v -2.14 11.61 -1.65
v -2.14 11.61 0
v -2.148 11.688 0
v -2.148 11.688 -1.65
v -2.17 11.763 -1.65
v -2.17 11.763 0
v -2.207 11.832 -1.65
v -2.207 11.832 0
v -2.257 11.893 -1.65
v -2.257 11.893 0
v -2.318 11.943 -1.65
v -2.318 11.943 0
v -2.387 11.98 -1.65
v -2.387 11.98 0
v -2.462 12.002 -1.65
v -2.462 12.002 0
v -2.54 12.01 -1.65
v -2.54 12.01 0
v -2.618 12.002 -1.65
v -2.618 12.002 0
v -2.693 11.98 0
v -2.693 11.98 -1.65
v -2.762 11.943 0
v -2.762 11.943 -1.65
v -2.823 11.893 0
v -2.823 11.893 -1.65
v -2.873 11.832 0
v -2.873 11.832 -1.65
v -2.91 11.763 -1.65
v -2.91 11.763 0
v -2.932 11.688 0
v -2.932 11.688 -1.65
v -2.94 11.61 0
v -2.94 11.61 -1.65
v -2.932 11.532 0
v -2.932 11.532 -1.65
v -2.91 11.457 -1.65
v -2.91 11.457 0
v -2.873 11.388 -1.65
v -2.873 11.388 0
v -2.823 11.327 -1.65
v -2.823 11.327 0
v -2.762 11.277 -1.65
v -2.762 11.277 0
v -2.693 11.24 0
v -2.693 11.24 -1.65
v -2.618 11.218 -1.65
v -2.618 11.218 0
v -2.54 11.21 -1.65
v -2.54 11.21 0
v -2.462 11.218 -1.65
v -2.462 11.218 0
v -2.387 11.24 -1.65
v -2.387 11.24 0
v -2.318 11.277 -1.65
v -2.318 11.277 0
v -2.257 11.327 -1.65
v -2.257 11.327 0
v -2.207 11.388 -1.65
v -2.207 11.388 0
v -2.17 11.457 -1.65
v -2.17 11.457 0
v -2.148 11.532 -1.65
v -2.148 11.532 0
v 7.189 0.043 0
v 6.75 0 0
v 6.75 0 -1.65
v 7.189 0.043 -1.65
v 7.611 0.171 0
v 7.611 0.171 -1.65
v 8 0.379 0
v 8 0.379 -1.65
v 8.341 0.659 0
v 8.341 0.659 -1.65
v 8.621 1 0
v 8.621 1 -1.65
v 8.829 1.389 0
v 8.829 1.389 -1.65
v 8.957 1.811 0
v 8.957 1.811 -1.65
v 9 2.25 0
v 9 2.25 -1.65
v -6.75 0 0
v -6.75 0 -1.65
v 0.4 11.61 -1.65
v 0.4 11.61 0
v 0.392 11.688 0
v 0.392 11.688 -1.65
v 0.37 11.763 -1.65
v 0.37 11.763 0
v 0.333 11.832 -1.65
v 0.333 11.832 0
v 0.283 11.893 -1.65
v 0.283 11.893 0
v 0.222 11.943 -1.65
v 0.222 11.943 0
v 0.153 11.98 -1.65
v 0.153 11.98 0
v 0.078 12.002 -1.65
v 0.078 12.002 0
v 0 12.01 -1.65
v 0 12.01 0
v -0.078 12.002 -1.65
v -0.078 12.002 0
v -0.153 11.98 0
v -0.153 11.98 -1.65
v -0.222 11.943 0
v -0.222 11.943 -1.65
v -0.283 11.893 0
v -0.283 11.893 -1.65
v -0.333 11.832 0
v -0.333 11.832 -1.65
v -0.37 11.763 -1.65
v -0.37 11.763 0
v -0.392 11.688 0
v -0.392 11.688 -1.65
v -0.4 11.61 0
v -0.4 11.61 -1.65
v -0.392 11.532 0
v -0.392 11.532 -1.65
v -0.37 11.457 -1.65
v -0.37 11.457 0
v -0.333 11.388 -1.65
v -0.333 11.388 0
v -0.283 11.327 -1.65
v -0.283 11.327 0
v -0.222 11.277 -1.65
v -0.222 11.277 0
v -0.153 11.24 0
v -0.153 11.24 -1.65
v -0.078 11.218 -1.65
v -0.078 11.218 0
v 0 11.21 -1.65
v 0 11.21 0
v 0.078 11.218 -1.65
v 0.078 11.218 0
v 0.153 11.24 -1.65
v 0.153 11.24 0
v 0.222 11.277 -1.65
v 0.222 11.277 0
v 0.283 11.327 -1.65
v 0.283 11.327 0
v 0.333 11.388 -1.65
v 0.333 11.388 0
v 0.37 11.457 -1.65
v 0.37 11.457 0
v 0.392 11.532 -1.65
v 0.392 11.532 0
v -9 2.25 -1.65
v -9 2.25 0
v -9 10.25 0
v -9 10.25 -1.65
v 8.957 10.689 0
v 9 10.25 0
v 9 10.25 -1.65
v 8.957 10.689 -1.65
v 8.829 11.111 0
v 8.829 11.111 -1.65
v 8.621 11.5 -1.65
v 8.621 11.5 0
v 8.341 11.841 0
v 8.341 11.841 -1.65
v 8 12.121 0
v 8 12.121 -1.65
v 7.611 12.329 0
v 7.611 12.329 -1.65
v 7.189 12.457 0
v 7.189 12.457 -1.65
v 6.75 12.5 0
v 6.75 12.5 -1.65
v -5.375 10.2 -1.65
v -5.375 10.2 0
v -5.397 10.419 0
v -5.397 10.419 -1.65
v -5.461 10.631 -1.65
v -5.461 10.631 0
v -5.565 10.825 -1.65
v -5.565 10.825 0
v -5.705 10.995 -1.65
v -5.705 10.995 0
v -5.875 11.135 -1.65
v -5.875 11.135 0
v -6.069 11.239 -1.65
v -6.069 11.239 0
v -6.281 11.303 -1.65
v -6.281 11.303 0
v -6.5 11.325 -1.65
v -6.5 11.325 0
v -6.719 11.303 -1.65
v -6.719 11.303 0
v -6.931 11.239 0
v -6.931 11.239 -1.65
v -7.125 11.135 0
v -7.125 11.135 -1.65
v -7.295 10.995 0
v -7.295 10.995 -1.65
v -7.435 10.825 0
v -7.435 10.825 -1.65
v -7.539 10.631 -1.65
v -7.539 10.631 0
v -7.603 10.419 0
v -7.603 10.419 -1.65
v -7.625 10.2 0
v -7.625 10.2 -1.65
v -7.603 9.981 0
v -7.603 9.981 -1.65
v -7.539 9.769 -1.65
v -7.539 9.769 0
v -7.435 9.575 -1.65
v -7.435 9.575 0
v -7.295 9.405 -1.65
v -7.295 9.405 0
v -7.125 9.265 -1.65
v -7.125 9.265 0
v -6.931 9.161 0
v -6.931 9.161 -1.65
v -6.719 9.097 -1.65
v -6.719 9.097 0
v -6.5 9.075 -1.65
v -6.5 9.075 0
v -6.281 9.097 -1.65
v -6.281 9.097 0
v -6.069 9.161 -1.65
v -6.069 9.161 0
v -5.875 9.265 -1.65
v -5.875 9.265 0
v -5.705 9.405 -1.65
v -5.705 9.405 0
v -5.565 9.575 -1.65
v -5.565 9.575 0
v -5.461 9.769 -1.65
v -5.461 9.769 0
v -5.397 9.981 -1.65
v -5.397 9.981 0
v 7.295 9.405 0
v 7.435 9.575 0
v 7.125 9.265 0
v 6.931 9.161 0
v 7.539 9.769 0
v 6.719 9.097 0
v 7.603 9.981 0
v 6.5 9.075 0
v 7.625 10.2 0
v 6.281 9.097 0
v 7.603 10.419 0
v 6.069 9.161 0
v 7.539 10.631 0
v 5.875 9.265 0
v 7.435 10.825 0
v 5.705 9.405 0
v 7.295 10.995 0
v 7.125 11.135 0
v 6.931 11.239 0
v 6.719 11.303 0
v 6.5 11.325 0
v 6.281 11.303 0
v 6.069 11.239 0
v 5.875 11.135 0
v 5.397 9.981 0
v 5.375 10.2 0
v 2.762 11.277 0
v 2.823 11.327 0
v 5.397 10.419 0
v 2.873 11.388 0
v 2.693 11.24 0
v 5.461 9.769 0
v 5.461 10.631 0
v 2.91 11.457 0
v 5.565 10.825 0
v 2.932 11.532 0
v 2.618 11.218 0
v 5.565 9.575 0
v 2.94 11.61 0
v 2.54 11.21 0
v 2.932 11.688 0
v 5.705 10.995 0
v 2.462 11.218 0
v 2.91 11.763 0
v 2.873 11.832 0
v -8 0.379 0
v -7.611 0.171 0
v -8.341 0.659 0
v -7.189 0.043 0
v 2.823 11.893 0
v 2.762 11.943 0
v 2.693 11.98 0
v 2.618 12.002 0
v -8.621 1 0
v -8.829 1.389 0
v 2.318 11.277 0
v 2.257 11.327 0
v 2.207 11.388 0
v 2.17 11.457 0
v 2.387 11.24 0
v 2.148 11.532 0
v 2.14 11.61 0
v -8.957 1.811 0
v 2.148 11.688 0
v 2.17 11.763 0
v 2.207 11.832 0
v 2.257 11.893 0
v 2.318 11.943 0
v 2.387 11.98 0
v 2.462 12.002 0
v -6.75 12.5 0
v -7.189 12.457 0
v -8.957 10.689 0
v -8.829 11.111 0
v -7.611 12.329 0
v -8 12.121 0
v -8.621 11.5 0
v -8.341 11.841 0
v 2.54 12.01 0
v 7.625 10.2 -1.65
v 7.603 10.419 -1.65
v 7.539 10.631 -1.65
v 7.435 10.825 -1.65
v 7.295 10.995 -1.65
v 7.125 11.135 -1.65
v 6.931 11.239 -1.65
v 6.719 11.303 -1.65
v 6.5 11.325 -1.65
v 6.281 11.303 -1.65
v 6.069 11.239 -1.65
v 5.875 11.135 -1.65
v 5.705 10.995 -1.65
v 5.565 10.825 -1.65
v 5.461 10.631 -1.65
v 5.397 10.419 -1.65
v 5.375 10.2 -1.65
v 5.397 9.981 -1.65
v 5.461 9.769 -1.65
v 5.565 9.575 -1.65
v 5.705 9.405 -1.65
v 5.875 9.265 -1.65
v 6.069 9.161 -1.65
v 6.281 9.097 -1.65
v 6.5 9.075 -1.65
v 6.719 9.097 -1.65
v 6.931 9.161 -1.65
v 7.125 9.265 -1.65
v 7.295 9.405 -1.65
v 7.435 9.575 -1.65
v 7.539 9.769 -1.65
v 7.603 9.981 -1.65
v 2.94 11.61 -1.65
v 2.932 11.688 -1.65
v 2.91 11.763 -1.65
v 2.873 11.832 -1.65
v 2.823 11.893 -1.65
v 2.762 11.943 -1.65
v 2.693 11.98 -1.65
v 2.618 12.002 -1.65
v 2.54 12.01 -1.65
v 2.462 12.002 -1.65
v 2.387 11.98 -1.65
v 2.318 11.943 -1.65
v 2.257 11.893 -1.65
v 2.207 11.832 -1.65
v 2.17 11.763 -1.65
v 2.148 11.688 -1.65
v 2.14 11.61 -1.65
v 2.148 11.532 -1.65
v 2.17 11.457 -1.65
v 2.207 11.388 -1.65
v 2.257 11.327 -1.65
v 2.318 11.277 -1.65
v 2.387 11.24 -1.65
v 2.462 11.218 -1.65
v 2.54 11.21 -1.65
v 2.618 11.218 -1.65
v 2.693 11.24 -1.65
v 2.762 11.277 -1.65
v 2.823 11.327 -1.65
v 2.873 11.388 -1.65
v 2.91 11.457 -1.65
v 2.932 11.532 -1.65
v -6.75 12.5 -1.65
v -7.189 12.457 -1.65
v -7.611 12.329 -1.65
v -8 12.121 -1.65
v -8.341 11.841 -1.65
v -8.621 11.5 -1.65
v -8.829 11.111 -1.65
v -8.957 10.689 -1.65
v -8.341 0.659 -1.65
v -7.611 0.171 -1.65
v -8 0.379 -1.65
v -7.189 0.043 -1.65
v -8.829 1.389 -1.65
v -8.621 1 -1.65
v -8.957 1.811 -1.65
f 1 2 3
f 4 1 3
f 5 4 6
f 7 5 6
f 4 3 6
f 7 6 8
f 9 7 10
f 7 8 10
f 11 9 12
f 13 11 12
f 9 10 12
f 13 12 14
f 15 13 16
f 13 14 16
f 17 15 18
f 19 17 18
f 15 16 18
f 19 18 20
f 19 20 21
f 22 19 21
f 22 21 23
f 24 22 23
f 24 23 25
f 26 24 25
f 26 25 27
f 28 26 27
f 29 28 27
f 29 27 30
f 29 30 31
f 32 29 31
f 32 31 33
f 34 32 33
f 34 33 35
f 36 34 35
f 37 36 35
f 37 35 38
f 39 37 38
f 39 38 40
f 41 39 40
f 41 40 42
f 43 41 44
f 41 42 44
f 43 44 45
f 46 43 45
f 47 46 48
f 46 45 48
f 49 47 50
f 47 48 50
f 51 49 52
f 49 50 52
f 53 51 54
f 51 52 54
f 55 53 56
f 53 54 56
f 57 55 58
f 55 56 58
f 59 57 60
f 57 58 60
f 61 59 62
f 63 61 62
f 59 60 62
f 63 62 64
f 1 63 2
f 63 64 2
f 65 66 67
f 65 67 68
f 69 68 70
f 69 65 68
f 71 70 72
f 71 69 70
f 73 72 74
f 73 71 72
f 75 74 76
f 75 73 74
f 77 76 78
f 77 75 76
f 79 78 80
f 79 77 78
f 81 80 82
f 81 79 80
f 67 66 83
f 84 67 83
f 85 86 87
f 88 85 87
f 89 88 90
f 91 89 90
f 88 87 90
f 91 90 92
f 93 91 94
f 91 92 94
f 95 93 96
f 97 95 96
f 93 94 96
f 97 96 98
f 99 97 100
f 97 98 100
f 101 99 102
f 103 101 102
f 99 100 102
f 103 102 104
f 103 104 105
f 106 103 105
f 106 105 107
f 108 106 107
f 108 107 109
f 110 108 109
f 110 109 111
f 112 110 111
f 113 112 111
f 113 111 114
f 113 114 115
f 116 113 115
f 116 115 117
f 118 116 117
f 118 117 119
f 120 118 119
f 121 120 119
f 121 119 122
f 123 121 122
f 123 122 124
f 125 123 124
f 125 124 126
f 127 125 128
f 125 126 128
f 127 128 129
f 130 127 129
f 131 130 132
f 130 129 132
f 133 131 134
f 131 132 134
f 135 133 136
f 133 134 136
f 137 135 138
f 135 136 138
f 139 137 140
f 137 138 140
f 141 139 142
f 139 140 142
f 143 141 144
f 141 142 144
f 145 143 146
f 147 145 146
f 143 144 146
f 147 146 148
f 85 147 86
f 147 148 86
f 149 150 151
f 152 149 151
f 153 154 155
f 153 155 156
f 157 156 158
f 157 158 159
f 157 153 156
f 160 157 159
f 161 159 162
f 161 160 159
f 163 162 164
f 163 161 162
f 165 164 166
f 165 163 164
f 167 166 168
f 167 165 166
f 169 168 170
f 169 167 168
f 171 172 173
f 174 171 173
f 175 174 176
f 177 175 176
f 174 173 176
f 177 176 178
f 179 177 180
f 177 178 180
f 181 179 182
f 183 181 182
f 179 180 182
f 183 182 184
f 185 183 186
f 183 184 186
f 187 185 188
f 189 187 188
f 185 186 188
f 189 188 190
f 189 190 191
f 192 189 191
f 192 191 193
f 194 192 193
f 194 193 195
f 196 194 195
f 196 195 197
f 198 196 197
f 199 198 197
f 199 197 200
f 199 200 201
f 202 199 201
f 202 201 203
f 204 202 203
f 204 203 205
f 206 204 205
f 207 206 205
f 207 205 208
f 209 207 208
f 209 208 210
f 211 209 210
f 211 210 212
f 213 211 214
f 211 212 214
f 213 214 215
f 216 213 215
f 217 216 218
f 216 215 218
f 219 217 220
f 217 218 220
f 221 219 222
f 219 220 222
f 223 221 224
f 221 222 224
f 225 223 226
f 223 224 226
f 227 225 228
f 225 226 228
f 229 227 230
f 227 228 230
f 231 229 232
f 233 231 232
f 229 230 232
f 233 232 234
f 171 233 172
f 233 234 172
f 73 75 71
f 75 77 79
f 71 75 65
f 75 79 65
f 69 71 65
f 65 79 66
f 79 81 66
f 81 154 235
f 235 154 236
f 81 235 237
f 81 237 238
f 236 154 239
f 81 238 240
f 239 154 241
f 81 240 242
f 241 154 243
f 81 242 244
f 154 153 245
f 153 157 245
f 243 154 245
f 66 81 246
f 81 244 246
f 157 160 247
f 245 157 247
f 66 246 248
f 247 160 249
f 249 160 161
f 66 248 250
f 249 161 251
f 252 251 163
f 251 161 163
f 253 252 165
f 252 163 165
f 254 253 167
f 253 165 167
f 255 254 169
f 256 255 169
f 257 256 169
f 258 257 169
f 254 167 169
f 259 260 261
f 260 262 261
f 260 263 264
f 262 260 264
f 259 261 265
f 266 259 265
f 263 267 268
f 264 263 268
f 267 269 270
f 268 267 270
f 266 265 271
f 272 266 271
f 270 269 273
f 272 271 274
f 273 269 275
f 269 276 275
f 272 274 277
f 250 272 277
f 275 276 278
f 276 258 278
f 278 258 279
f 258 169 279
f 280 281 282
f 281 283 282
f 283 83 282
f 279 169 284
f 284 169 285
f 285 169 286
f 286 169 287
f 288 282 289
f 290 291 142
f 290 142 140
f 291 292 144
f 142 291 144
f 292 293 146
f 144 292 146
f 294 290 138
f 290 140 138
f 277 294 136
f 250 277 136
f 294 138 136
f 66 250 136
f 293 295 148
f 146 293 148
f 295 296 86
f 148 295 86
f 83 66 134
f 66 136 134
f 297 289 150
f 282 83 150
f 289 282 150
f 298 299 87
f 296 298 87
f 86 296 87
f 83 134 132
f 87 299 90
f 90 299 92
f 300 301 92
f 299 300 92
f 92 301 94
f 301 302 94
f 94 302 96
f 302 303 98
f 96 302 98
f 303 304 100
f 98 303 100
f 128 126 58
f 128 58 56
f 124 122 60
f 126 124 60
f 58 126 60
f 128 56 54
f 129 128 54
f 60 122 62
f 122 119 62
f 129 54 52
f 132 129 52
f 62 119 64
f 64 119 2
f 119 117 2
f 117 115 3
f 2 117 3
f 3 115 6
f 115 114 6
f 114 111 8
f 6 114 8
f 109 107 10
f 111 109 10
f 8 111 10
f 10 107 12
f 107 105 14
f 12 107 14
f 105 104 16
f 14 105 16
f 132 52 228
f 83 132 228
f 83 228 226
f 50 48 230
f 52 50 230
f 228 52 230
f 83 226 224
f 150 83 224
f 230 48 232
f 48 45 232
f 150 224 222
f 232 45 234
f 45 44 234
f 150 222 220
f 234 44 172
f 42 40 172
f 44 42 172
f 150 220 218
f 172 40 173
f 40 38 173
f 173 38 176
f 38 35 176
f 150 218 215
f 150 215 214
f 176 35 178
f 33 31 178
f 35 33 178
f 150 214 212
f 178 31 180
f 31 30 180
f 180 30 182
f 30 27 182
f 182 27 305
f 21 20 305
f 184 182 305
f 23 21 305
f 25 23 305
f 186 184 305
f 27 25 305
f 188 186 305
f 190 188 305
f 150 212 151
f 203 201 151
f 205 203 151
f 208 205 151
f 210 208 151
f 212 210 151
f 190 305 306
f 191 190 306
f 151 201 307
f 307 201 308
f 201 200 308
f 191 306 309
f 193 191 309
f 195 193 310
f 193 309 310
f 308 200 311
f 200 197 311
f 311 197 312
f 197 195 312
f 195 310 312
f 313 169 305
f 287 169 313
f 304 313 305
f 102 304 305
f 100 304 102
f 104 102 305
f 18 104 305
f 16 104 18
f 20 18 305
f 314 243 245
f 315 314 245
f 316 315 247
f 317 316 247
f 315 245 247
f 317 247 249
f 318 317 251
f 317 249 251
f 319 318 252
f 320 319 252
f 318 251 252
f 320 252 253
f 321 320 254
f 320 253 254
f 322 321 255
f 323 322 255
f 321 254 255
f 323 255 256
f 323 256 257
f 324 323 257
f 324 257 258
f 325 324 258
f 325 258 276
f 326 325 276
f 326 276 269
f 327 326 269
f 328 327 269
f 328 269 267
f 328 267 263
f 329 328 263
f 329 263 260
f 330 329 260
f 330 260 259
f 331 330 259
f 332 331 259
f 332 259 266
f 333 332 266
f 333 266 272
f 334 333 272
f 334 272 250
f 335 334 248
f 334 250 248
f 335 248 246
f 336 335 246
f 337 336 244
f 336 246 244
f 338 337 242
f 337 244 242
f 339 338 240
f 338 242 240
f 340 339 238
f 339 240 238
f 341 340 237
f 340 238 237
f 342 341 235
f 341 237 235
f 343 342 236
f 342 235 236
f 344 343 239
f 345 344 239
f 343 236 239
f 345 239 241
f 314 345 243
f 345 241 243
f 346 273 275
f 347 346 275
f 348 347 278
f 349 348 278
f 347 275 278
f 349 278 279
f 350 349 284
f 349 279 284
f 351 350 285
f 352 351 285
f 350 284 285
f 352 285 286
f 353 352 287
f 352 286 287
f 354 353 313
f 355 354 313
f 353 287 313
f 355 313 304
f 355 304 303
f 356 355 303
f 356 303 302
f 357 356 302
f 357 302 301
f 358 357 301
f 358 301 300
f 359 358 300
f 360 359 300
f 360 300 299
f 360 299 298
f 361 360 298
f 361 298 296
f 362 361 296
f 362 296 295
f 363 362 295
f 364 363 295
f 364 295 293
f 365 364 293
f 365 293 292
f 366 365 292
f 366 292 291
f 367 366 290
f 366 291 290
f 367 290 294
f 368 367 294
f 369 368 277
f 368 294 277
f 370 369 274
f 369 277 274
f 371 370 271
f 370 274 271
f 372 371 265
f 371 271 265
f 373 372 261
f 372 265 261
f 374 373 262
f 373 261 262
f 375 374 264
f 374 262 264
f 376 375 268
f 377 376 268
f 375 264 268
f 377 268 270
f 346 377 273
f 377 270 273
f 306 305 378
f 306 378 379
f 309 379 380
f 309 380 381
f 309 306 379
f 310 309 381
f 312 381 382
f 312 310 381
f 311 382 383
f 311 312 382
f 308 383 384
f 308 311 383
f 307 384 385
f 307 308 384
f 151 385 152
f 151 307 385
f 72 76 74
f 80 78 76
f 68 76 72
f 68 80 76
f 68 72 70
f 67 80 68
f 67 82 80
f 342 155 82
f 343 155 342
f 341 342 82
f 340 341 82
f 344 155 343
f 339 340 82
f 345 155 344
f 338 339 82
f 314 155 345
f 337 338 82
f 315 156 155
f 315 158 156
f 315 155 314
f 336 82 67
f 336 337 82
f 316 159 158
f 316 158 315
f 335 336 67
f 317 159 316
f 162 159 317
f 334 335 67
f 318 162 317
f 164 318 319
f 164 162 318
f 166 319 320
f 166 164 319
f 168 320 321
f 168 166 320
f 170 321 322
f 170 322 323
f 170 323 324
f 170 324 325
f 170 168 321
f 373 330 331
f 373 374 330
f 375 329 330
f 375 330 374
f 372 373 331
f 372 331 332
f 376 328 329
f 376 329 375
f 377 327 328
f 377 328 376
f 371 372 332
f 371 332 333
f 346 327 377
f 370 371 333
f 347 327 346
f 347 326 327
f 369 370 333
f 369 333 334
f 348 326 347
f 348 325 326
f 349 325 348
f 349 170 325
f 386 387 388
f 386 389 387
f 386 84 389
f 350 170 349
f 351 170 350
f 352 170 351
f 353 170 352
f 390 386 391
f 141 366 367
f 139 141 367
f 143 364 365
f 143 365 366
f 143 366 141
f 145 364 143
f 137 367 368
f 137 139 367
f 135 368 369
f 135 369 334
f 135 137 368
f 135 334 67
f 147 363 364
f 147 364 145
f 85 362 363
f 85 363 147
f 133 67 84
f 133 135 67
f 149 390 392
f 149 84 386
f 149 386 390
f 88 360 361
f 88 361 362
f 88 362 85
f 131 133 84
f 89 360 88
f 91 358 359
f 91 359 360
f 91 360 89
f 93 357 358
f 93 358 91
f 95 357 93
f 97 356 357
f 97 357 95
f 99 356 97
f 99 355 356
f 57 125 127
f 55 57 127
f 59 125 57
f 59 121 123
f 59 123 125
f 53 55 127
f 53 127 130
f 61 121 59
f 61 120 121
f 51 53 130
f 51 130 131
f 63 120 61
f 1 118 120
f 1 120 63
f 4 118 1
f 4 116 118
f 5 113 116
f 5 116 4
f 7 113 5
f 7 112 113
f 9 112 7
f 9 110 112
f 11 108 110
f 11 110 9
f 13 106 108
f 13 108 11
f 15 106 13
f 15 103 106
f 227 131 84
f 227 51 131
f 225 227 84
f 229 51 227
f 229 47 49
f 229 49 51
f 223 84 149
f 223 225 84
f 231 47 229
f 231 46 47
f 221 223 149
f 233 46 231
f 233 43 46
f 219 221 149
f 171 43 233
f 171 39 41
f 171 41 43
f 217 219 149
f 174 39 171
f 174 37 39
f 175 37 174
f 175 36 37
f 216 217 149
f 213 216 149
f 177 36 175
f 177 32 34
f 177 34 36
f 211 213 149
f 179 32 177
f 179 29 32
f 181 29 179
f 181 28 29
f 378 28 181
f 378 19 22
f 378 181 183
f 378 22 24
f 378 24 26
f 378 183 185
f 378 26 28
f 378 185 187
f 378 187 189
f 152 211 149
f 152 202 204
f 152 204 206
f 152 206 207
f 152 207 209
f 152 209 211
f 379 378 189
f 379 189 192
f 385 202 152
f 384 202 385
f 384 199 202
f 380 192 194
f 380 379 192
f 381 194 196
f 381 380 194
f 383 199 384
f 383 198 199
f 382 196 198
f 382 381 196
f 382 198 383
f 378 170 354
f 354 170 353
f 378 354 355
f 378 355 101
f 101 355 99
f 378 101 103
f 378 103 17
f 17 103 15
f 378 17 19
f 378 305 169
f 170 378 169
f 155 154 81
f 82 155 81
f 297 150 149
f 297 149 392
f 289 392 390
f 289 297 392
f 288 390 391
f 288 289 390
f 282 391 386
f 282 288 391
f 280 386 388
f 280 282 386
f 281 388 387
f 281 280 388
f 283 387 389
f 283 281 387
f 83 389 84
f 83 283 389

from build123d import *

# Parameters (mm, degrees)
PAD012_DEPTH    = 1.65
SKETCH037_R     = 1.125
POCKET011_DEPTH = 1.651
SKETCH038_R     = 0.4
POCKET001_DEPTH = 1.651


with BuildPart() as part:
    # Sketch036 → Pad012 (new body)
    with BuildSketch(Plane.XY):
        with BuildLine():
            Line((-6.75, 12.5), (6.75, 12.5))
            ThreePointArc((9, 10.25), (8.34099, 11.84099), (6.75, 12.5))
            Line((9, 10.25), (9, 2.25))
            ThreePointArc((6.75, 0), (8.34099, 0.65901), (9, 2.25))
            Line((6.75, 0), (-6.75, 0))
            ThreePointArc((-9, 2.25), (-8.34099, 0.65901), (-6.75, 0))
            Line((-9, 2.25), (-9, 10.25))
            ThreePointArc((-6.75, 12.5), (-8.34099, 11.84099), (-9, 10.25))
        make_face()
    extrude(amount=-PAD012_DEPTH)

    # Sketch037 → Pocket011 (cut, through all)
    with BuildSketch(Plane.XY):
        with Locations((-6.5, 10.2)):
            Circle(SKETCH037_R)
        with Locations((6.5, 10.2)):
            Circle(SKETCH037_R)
    extrude(amount=-POCKET011_DEPTH, mode=Mode.SUBTRACT)

    # Sketch038 → Pocket001 (cut, through all)
    with BuildSketch(Plane.XY):
        with Locations((0, 11.61)):
            Circle(SKETCH038_R)
        with Locations((2.54, 11.61)):
            Circle(SKETCH038_R)
        with Locations((-2.54, 11.61)):
            Circle(SKETCH038_R)
    extrude(amount=-POCKET001_DEPTH, mode=Mode.SUBTRACT)


solid = part.part
